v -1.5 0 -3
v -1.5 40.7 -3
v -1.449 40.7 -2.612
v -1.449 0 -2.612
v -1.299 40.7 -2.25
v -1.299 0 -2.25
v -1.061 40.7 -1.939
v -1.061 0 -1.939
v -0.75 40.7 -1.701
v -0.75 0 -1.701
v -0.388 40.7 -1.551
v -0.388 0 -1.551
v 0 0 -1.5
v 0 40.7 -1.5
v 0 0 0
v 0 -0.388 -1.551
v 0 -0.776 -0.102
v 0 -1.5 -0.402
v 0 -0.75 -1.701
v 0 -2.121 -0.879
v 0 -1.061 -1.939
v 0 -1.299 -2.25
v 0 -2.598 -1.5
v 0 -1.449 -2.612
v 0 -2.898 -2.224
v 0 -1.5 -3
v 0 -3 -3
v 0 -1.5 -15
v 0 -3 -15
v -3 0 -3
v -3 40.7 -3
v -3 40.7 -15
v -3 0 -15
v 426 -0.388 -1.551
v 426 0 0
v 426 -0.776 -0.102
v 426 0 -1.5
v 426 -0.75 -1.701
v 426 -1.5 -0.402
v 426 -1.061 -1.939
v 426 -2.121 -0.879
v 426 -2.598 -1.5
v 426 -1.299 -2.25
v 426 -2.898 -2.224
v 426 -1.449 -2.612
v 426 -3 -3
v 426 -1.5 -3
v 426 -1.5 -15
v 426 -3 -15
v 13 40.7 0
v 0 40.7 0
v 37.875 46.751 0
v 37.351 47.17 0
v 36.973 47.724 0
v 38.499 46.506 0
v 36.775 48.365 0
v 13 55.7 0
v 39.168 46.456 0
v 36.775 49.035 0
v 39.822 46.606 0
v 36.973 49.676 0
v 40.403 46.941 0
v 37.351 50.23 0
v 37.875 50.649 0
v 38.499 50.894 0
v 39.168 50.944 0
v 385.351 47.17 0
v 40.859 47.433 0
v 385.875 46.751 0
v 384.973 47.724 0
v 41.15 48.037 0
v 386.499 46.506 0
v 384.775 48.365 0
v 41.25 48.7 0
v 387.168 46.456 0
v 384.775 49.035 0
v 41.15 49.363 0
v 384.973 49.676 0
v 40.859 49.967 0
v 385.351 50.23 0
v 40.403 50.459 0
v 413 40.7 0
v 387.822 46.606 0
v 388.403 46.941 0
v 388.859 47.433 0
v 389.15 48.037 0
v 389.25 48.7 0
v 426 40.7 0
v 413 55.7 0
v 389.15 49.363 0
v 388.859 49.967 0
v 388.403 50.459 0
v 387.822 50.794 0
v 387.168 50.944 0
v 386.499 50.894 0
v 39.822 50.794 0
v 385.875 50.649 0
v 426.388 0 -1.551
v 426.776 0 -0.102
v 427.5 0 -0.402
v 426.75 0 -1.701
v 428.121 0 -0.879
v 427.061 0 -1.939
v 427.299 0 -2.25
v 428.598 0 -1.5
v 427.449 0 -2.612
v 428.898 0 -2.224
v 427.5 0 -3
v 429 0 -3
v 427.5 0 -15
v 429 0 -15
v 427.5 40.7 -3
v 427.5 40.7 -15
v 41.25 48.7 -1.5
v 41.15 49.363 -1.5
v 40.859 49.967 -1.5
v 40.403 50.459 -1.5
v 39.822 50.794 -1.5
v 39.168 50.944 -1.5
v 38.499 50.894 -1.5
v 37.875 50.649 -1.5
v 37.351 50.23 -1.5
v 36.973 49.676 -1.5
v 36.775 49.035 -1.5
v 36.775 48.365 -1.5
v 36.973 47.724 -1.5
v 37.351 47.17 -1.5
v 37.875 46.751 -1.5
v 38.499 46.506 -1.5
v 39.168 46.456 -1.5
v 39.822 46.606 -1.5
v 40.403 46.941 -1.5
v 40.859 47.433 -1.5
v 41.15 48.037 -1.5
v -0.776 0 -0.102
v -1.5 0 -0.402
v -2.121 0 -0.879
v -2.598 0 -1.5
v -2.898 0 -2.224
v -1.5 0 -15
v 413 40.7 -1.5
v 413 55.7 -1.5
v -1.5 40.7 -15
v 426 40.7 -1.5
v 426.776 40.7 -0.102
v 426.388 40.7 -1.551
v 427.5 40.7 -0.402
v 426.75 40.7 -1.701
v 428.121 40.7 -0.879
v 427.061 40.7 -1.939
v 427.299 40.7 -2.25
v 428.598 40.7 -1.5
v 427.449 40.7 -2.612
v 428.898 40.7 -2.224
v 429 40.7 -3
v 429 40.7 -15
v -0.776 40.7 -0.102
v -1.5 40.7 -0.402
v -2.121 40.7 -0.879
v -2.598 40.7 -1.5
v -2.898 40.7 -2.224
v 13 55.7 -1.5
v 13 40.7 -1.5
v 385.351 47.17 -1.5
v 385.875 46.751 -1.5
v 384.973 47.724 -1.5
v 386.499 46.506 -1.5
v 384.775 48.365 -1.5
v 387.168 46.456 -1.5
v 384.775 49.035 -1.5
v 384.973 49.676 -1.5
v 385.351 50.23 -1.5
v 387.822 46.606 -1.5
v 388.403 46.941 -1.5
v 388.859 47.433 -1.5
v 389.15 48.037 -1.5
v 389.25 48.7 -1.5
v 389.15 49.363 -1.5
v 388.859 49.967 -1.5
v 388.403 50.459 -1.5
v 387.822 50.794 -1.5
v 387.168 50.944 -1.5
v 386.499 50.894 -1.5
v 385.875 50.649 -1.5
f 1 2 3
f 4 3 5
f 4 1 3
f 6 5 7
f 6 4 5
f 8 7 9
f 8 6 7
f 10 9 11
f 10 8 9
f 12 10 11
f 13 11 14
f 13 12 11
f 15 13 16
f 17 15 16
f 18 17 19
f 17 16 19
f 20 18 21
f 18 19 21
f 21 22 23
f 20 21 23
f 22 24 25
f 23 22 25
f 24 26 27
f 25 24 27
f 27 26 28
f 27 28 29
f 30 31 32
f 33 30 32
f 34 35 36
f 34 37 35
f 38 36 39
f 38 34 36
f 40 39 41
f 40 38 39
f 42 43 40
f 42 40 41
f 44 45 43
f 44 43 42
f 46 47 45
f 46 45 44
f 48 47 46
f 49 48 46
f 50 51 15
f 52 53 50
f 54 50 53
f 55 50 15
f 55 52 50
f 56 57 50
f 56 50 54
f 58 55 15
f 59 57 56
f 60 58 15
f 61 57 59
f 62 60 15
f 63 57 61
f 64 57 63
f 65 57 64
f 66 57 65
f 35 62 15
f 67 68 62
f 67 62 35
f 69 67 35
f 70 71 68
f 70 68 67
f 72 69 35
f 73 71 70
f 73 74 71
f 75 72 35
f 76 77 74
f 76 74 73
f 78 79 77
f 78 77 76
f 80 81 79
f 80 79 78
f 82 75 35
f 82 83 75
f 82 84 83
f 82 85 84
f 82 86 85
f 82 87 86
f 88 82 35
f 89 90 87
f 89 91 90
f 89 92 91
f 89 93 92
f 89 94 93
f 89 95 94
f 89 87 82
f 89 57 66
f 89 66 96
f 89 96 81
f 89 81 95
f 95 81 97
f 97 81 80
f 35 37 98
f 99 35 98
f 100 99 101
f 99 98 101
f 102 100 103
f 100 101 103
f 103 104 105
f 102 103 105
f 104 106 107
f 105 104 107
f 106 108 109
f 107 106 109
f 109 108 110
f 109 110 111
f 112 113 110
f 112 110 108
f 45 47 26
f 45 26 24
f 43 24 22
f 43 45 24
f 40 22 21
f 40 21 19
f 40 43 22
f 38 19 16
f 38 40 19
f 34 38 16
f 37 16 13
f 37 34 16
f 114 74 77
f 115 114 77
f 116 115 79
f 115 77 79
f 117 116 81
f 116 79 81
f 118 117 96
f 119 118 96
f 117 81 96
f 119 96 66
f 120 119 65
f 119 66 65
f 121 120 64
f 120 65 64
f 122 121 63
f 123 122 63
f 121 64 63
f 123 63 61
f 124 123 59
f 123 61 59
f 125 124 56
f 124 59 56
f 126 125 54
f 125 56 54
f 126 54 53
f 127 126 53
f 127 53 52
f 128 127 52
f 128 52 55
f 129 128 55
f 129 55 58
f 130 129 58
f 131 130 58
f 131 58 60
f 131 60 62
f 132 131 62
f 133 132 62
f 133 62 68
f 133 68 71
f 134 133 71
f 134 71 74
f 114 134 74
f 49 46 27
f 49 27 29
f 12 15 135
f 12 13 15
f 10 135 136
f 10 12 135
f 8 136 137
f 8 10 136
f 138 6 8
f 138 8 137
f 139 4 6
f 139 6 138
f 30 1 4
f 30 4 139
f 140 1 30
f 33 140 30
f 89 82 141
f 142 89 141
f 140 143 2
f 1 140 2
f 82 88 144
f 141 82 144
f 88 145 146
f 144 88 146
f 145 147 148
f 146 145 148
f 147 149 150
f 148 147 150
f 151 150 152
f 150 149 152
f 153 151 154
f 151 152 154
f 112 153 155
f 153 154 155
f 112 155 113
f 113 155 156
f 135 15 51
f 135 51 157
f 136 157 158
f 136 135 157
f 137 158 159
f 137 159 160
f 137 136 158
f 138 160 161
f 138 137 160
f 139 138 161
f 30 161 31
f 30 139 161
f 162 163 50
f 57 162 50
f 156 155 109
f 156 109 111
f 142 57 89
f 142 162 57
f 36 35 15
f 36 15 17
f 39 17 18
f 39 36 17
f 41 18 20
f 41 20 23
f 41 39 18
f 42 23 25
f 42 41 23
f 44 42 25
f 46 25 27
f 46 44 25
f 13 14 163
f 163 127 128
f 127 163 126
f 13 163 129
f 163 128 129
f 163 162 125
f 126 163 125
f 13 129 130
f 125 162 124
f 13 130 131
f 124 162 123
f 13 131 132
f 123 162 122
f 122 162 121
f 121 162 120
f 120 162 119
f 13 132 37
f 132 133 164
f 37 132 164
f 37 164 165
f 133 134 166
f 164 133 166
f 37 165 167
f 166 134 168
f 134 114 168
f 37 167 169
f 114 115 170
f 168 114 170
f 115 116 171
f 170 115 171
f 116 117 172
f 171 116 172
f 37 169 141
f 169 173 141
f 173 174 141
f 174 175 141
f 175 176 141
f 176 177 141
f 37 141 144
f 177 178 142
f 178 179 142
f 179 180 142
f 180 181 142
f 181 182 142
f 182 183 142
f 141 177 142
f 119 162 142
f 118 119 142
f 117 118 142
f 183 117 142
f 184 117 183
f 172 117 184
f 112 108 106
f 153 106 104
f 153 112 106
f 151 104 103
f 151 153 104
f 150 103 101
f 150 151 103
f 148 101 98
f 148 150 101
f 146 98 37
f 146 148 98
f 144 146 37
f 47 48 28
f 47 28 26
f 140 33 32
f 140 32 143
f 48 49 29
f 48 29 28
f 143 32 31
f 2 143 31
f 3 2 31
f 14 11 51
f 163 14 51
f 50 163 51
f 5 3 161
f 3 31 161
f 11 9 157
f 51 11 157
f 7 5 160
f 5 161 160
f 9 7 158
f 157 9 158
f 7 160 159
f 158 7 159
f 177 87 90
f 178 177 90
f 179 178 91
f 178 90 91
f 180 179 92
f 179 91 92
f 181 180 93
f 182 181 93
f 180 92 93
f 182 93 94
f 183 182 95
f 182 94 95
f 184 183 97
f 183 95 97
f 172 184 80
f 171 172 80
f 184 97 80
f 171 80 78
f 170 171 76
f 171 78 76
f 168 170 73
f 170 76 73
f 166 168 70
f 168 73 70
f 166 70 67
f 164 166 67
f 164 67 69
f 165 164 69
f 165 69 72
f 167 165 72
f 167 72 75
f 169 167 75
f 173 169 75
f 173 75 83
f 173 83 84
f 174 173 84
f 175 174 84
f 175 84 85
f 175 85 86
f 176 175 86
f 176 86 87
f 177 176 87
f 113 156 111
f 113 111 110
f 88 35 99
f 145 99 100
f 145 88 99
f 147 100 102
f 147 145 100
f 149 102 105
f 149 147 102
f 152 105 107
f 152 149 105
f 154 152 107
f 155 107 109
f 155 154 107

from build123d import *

# Parameters (mm, degrees)
SKETCH_1_W             = 426
SKETCH_1_H             = 55.7
SM_BASE_FLANGE_1_DEPTH = 1.5
SM_EDGE_FLANGE_2_DEPTH = 55.7
SM_EDGE_FLANGE_3_DEPTH = 426
SM_EDGE_FLANGE_4_DEPTH = 55.7
SKETCH_25_W            = 15
SKETCH_25_H            = 15
CUT_EXTRUDE_1_DEPTH    = 16
SKETCH_26_W            = 15
SKETCH_26_H            = 15
CUT_EXTRUDE_2_DEPTH    = 16
SKETCH_27_R            = 2.25
CUT_EXTRUDE_3_DEPTH    = 433.860820588


# Sheet-metal steps are written as plain solids
with BuildPart() as part:
    # Sketch 1 → Базовая кромка1 (new body)
    with BuildSketch(Plane.XY):
        with Locations((213, 27.85)):
            Rectangle(SKETCH_1_W, SKETCH_1_H)
    extrude(amount=-SM_BASE_FLANGE_1_DEPTH)

    # Ребро-кромка2 section (across the edge) → Ребро-кромка2 (add)
    with BuildSketch(Plane(origin=(-1.5, 0, -1.5), x_dir=(1, 0, 0), z_dir=(0, 1, 0))):
        with BuildLine():
            Line((-1.5, 1.5), (-1.5, 13.5))
            Line((-1.5, 13.5), (0, 13.5))
            Line((0, 13.5), (0, 1.5))
            ThreePointArc((0, 1.5), (0.439339828, 0.439339828), (1.5, 0))
            Line((1.5, 0), (1.5, -1.5))
            ThreePointArc((1.5, -1.5), (-0.621320344, -0.621320344), (-1.5, 1.5))
        make_face()
    extrude(amount=SM_EDGE_FLANGE_2_DEPTH)

    # Ребро-кромка3 section (across the edge) → Ребро-кромка3 (add)
    with BuildSketch(Plane(origin=(426, -1.5, -1.5), x_dir=(0, 1, 0), z_dir=(-1, 0, 0))):
        with BuildLine():
            Line((-1.5, 1.5), (-1.5, 13.5))
            Line((-1.5, 13.5), (0, 13.5))
            Line((0, 13.5), (0, 1.5))
            ThreePointArc((0, 1.5), (0.439339828, 0.439339828), (1.5, 0))
            Line((1.5, 0), (1.5, -1.5))
            ThreePointArc((1.5, -1.5), (-0.621320344, -0.621320344), (-1.5, 1.5))
        make_face()
    extrude(amount=SM_EDGE_FLANGE_3_DEPTH)

    # Ребро-кромка4 section (across the edge) → Ребро-кромка4 (add)
    with BuildSketch(Plane(origin=(427.5, 55.7, -1.5), x_dir=(-1, 0, 0), z_dir=(0, -1, 0))):
        with BuildLine():
            Line((-1.5, 1.5), (-1.5, 13.5))
            Line((-1.5, 13.5), (0, 13.5))
            Line((0, 13.5), (0, 1.5))
            ThreePointArc((0, 1.5), (0.439339828, 0.439339828), (1.5, 0))
            Line((1.5, 0), (1.5, -1.5))
            ThreePointArc((1.5, -1.5), (-0.621320344, -0.621320344), (-1.5, 1.5))
        make_face()
    extrude(amount=SM_EDGE_FLANGE_4_DEPTH)

    # Эскиз25 → Вырез-Вытянуть1 (cut)
    with BuildSketch(Plane.ZY.offset(3)):
        with Locations((-7.5, 48.2)):
            Rectangle(SKETCH_25_W, SKETCH_25_H)
    extrude(amount=-CUT_EXTRUDE_1_DEPTH, mode=Mode.SUBTRACT)

    # Эскиз26 → Вырез-Вытянуть2 (cut)
    with BuildSketch(Plane(origin=(429, 0, 0), x_dir=(0, 0, -1), z_dir=(1, 0, 0))):
        with Locations((7.5, 48.2)):
            Rectangle(SKETCH_26_W, SKETCH_26_H)
    extrude(amount=-CUT_EXTRUDE_2_DEPTH, mode=Mode.SUBTRACT)

    # Эскиз27 → Вырез-Вытянуть3 (cut, through all)
    with BuildSketch(Plane.XY):
        with Locations((39, 48.7)):
            Circle(SKETCH_27_R)
        with Locations((387, 48.7)):
            Circle(SKETCH_27_R)
    extrude(amount=-CUT_EXTRUDE_3_DEPTH, mode=Mode.SUBTRACT)


solid = part.part
